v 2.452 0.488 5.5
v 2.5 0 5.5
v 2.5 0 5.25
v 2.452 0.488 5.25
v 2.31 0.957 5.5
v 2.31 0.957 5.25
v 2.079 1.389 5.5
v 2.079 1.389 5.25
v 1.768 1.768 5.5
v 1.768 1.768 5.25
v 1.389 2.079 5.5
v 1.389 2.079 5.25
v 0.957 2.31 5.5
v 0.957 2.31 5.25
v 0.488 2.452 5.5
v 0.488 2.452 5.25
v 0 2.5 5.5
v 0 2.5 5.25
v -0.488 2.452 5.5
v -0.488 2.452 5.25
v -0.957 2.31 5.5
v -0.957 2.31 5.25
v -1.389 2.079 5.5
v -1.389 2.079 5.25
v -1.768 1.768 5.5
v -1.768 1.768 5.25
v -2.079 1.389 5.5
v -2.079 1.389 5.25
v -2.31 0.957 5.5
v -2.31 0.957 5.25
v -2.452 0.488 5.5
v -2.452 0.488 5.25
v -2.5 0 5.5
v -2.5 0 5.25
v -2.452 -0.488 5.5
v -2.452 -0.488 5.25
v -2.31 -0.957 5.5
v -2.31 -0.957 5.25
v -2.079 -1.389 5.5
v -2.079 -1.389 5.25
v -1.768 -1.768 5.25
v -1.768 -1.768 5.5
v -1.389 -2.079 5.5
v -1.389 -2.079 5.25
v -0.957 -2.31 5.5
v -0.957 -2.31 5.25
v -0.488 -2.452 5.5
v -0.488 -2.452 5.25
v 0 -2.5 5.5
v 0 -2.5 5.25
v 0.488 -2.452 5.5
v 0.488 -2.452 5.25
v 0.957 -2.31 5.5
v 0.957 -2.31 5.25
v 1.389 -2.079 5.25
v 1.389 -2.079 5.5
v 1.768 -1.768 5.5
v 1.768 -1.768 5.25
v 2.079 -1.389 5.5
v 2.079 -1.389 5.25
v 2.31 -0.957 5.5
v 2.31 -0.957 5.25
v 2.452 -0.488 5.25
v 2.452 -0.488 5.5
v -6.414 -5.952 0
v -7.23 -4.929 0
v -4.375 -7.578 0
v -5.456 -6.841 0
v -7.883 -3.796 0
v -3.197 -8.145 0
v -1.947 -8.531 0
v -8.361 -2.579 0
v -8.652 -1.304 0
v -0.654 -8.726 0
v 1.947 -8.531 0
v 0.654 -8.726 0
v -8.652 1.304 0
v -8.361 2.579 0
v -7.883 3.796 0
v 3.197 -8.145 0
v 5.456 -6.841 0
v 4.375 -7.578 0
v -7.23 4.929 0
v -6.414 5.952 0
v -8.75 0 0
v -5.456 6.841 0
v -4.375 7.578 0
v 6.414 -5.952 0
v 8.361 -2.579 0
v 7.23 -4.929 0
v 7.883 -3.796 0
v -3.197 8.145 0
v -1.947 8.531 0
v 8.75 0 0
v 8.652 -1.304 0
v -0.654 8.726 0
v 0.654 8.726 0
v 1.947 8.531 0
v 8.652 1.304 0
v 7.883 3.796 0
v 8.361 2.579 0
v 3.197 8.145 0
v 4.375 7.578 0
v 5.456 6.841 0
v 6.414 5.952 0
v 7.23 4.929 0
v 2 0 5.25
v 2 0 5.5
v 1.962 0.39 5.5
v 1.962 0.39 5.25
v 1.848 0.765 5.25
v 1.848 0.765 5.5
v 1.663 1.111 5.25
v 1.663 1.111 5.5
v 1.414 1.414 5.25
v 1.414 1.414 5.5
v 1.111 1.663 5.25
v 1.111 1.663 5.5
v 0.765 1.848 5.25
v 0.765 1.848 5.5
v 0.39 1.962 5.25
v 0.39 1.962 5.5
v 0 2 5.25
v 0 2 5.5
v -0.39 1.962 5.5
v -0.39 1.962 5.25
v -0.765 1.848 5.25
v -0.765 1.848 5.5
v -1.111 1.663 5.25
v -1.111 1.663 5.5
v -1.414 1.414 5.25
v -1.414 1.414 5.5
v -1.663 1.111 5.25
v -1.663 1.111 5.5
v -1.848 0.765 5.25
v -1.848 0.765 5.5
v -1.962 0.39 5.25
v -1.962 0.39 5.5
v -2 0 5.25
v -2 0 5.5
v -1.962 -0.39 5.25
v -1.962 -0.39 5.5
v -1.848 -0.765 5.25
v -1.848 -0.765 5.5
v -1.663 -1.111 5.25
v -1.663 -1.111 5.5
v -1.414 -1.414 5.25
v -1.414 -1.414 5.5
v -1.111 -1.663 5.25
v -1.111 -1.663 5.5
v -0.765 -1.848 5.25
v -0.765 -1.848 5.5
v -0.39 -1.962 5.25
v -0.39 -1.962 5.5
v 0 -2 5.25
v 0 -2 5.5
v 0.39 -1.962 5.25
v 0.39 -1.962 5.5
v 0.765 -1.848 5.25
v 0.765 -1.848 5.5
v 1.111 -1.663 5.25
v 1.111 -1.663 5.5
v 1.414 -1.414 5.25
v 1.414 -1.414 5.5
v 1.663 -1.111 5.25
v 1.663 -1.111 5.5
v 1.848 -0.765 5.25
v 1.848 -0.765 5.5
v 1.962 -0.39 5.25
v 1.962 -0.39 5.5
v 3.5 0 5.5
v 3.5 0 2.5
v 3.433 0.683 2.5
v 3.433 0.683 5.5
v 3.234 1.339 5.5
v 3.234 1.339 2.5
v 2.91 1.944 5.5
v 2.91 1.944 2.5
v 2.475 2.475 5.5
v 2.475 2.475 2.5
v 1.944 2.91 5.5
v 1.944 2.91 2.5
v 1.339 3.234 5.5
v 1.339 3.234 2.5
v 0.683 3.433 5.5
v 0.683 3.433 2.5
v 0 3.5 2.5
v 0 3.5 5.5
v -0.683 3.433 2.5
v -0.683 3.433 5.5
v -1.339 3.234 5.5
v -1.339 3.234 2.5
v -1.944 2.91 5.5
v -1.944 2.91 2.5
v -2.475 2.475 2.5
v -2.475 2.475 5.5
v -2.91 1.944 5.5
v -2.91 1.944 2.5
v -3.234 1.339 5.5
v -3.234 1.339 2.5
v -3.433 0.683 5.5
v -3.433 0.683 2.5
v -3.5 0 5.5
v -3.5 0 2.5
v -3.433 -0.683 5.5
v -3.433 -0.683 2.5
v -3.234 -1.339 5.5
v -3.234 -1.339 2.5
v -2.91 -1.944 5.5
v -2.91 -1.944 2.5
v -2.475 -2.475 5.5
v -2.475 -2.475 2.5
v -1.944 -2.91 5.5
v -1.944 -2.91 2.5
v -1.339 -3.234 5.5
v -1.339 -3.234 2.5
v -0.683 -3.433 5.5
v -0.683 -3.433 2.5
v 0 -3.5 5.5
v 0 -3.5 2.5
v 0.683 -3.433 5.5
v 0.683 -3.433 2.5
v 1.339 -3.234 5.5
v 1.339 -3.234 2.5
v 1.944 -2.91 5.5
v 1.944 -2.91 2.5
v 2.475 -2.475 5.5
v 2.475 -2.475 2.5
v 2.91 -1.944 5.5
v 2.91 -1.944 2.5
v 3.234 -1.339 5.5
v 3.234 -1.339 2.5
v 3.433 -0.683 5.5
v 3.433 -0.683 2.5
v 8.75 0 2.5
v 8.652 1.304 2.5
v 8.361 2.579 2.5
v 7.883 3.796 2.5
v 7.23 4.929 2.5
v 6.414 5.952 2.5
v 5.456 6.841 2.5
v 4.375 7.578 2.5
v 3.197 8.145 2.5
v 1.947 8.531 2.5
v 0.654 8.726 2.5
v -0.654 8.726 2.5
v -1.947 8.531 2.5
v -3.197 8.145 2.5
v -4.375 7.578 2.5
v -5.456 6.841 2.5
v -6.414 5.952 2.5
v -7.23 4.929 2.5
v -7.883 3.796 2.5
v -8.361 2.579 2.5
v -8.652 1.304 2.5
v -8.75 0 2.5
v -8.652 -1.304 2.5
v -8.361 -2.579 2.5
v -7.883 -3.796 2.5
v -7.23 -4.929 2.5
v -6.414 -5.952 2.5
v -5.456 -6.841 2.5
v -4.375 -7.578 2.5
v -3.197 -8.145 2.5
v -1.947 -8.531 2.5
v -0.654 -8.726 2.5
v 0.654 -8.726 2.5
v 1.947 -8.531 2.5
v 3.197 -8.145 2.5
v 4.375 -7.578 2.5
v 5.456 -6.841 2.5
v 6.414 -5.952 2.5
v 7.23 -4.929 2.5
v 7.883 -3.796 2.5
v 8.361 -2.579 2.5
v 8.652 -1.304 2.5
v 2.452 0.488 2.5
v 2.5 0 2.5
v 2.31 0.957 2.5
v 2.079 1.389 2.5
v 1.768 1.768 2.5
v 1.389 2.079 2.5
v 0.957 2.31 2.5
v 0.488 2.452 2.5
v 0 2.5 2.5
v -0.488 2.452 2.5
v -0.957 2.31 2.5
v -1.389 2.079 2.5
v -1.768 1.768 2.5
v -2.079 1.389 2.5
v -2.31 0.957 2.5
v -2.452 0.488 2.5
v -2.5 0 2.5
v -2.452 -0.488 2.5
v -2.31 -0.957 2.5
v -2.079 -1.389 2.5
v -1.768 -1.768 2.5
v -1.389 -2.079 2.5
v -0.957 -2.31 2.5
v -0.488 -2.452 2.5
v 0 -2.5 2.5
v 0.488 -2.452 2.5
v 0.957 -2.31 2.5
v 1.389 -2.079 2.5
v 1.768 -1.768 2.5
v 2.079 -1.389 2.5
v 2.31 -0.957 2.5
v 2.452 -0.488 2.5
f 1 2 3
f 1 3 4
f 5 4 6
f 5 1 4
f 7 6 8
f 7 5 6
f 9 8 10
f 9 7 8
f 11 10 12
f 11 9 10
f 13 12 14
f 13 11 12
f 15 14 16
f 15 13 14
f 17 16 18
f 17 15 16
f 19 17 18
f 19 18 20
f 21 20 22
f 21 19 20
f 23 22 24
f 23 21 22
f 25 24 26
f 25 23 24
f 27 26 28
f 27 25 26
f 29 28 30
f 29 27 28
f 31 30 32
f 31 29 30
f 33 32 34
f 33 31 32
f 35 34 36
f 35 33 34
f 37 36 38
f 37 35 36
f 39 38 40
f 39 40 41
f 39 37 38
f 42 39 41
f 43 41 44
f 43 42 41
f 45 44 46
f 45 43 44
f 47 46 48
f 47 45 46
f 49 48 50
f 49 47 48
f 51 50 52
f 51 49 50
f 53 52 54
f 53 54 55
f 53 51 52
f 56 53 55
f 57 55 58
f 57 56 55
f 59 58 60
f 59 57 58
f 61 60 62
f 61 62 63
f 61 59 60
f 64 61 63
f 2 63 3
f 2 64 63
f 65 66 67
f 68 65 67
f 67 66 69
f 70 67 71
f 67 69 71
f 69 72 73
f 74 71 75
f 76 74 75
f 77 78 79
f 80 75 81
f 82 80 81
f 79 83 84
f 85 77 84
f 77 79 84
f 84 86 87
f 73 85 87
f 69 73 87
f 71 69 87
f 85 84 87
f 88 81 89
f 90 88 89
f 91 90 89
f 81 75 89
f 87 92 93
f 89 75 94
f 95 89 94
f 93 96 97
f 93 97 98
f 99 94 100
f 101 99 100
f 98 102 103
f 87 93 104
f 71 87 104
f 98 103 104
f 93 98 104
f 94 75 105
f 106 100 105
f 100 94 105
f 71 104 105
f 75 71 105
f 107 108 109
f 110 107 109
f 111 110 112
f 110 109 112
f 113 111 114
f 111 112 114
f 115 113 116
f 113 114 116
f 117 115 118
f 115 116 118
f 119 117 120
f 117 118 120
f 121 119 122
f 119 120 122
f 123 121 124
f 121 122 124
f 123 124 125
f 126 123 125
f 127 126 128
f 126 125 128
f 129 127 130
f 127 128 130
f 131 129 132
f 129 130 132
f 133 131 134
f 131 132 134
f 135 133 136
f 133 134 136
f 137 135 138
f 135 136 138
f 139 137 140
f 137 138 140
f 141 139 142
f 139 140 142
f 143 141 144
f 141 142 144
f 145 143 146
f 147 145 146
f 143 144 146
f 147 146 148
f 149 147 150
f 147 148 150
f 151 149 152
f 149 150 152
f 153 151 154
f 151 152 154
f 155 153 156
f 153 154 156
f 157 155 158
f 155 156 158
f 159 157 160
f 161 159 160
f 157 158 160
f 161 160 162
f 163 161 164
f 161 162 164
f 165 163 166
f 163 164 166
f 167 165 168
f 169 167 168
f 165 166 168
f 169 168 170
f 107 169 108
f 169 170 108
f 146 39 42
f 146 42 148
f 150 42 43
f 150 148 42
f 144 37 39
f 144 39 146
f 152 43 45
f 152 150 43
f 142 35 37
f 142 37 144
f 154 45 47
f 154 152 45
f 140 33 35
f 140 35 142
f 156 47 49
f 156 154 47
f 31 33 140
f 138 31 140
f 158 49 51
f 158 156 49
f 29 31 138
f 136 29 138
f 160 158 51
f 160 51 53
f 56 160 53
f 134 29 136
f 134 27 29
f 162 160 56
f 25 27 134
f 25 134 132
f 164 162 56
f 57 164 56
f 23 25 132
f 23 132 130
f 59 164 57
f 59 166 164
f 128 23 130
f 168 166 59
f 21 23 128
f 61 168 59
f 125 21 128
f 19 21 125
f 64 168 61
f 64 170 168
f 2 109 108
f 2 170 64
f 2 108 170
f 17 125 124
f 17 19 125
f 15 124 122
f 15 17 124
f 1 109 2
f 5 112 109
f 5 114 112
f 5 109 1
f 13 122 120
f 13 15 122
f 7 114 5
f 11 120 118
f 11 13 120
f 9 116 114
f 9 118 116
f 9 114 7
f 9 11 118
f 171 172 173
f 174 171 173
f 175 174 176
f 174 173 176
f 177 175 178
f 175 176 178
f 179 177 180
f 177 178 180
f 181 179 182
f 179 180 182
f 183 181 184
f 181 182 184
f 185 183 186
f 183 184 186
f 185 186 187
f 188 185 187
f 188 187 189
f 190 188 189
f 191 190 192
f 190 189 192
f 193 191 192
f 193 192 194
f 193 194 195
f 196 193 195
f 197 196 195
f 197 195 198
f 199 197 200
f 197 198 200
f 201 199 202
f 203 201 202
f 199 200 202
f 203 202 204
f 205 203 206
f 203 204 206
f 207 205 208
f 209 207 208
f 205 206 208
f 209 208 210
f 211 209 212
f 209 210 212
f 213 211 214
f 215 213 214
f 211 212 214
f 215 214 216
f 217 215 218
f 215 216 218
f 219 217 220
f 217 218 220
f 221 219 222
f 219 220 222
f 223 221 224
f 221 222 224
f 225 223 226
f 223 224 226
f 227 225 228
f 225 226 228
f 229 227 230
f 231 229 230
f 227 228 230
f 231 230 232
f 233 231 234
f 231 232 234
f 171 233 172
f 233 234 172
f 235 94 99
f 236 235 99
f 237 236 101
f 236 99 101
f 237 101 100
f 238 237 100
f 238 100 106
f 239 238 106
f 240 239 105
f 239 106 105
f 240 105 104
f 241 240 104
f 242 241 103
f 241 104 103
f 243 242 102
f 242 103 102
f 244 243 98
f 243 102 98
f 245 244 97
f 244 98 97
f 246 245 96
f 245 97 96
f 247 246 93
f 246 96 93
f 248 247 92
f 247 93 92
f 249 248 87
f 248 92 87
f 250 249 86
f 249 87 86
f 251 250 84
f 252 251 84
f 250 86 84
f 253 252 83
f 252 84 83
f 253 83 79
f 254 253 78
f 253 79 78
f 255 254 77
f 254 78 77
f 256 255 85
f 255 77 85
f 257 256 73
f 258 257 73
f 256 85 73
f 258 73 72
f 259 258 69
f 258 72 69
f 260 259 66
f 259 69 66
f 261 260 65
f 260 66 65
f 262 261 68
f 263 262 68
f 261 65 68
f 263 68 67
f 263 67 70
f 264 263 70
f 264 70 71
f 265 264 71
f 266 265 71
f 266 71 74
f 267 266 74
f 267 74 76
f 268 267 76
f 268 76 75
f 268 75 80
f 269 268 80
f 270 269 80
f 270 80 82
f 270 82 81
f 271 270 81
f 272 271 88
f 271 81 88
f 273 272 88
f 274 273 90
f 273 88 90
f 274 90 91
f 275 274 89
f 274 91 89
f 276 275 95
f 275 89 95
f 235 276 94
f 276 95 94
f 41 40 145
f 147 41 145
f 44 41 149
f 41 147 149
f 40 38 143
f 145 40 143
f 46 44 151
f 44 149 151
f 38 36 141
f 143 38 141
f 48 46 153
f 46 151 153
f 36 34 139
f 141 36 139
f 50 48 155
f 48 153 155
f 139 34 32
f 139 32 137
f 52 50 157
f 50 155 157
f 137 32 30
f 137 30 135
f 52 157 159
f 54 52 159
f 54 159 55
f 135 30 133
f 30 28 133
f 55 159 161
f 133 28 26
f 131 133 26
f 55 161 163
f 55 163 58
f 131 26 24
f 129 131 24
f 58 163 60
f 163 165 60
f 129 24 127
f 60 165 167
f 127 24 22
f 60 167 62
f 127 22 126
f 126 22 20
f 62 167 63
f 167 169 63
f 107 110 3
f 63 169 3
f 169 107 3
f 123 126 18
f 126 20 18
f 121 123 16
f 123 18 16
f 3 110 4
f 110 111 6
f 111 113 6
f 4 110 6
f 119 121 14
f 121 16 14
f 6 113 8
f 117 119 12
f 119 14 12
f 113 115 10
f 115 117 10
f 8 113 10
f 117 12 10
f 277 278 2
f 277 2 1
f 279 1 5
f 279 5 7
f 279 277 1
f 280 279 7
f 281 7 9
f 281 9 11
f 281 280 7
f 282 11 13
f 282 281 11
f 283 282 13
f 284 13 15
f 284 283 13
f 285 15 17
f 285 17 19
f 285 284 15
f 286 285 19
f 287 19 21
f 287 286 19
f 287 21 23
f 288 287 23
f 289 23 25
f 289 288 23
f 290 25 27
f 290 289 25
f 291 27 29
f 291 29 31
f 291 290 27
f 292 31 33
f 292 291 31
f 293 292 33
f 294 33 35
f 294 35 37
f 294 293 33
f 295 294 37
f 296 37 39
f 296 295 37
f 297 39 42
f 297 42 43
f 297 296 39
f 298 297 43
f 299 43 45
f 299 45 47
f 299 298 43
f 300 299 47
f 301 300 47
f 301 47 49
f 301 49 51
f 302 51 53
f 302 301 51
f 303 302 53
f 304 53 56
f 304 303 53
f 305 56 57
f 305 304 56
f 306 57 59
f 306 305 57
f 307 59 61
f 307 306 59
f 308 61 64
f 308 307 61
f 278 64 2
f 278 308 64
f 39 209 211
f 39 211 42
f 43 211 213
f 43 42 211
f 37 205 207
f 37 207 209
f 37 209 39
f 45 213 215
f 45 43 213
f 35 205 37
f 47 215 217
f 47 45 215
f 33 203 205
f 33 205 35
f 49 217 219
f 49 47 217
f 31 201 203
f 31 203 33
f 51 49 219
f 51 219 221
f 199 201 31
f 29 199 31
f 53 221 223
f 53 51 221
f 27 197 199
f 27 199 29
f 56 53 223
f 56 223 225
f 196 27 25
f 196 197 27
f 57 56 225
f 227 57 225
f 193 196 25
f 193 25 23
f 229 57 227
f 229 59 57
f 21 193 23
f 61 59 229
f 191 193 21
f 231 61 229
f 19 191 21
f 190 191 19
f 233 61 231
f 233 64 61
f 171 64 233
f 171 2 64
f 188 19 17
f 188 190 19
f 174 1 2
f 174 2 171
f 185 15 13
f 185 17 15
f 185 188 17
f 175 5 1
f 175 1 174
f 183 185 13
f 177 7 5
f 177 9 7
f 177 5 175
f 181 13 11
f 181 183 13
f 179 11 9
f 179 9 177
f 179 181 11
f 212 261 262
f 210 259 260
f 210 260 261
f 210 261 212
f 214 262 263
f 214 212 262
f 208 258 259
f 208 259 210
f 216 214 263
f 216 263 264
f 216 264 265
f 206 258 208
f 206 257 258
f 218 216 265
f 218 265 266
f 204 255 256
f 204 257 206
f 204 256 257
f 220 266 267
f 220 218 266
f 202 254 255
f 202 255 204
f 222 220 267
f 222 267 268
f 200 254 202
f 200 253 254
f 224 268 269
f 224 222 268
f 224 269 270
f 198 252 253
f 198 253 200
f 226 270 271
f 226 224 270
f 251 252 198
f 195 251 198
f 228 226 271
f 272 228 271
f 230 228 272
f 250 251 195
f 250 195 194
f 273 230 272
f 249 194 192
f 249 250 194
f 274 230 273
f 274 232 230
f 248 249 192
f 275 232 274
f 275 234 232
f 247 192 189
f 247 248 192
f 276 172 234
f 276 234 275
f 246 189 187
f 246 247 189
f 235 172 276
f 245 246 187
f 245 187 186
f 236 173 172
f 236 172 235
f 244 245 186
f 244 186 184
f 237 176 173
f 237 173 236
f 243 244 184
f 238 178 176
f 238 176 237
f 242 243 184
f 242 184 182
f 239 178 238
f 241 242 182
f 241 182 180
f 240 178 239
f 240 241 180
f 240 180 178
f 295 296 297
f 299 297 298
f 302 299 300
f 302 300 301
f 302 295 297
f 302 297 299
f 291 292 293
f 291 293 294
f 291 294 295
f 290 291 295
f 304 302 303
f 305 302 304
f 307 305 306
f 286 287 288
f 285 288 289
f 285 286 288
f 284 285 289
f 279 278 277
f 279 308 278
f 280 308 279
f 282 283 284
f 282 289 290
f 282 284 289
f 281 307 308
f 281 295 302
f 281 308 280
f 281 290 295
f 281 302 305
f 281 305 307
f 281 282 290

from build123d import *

# Parameters (mm, degrees)
F0_R     = 8.75
F1_DEPTH = 2.5
F2_R     = 3.5
F2_R_2   = 2.5
F3_DEPTH = 3
F4_R     = 2.5
F4_R_2   = 2
F5_DEPTH = 0.25


with BuildPart() as f1:
    # F0 (on Top) → F1 (new body)
    with BuildSketch(Plane.XY):
        Circle(F0_R)
    extrude(amount=F1_DEPTH)

    # F2 (on face) → F3 (join)
    with BuildSketch(Plane.XY.offset(2.5)):
        Circle(F2_R)
        Circle(F2_R_2, mode=Mode.SUBTRACT)
    extrude(amount=F3_DEPTH)


with BuildPart() as f5:
    # F4 (on face) → F5 (new body)
    with BuildSketch(Plane.XY.offset(5.5)):
        Circle(F4_R)
        Circle(F4_R_2, mode=Mode.SUBTRACT)
    extrude(amount=-F5_DEPTH)


solid = Compound([f1.part, f5.part])
